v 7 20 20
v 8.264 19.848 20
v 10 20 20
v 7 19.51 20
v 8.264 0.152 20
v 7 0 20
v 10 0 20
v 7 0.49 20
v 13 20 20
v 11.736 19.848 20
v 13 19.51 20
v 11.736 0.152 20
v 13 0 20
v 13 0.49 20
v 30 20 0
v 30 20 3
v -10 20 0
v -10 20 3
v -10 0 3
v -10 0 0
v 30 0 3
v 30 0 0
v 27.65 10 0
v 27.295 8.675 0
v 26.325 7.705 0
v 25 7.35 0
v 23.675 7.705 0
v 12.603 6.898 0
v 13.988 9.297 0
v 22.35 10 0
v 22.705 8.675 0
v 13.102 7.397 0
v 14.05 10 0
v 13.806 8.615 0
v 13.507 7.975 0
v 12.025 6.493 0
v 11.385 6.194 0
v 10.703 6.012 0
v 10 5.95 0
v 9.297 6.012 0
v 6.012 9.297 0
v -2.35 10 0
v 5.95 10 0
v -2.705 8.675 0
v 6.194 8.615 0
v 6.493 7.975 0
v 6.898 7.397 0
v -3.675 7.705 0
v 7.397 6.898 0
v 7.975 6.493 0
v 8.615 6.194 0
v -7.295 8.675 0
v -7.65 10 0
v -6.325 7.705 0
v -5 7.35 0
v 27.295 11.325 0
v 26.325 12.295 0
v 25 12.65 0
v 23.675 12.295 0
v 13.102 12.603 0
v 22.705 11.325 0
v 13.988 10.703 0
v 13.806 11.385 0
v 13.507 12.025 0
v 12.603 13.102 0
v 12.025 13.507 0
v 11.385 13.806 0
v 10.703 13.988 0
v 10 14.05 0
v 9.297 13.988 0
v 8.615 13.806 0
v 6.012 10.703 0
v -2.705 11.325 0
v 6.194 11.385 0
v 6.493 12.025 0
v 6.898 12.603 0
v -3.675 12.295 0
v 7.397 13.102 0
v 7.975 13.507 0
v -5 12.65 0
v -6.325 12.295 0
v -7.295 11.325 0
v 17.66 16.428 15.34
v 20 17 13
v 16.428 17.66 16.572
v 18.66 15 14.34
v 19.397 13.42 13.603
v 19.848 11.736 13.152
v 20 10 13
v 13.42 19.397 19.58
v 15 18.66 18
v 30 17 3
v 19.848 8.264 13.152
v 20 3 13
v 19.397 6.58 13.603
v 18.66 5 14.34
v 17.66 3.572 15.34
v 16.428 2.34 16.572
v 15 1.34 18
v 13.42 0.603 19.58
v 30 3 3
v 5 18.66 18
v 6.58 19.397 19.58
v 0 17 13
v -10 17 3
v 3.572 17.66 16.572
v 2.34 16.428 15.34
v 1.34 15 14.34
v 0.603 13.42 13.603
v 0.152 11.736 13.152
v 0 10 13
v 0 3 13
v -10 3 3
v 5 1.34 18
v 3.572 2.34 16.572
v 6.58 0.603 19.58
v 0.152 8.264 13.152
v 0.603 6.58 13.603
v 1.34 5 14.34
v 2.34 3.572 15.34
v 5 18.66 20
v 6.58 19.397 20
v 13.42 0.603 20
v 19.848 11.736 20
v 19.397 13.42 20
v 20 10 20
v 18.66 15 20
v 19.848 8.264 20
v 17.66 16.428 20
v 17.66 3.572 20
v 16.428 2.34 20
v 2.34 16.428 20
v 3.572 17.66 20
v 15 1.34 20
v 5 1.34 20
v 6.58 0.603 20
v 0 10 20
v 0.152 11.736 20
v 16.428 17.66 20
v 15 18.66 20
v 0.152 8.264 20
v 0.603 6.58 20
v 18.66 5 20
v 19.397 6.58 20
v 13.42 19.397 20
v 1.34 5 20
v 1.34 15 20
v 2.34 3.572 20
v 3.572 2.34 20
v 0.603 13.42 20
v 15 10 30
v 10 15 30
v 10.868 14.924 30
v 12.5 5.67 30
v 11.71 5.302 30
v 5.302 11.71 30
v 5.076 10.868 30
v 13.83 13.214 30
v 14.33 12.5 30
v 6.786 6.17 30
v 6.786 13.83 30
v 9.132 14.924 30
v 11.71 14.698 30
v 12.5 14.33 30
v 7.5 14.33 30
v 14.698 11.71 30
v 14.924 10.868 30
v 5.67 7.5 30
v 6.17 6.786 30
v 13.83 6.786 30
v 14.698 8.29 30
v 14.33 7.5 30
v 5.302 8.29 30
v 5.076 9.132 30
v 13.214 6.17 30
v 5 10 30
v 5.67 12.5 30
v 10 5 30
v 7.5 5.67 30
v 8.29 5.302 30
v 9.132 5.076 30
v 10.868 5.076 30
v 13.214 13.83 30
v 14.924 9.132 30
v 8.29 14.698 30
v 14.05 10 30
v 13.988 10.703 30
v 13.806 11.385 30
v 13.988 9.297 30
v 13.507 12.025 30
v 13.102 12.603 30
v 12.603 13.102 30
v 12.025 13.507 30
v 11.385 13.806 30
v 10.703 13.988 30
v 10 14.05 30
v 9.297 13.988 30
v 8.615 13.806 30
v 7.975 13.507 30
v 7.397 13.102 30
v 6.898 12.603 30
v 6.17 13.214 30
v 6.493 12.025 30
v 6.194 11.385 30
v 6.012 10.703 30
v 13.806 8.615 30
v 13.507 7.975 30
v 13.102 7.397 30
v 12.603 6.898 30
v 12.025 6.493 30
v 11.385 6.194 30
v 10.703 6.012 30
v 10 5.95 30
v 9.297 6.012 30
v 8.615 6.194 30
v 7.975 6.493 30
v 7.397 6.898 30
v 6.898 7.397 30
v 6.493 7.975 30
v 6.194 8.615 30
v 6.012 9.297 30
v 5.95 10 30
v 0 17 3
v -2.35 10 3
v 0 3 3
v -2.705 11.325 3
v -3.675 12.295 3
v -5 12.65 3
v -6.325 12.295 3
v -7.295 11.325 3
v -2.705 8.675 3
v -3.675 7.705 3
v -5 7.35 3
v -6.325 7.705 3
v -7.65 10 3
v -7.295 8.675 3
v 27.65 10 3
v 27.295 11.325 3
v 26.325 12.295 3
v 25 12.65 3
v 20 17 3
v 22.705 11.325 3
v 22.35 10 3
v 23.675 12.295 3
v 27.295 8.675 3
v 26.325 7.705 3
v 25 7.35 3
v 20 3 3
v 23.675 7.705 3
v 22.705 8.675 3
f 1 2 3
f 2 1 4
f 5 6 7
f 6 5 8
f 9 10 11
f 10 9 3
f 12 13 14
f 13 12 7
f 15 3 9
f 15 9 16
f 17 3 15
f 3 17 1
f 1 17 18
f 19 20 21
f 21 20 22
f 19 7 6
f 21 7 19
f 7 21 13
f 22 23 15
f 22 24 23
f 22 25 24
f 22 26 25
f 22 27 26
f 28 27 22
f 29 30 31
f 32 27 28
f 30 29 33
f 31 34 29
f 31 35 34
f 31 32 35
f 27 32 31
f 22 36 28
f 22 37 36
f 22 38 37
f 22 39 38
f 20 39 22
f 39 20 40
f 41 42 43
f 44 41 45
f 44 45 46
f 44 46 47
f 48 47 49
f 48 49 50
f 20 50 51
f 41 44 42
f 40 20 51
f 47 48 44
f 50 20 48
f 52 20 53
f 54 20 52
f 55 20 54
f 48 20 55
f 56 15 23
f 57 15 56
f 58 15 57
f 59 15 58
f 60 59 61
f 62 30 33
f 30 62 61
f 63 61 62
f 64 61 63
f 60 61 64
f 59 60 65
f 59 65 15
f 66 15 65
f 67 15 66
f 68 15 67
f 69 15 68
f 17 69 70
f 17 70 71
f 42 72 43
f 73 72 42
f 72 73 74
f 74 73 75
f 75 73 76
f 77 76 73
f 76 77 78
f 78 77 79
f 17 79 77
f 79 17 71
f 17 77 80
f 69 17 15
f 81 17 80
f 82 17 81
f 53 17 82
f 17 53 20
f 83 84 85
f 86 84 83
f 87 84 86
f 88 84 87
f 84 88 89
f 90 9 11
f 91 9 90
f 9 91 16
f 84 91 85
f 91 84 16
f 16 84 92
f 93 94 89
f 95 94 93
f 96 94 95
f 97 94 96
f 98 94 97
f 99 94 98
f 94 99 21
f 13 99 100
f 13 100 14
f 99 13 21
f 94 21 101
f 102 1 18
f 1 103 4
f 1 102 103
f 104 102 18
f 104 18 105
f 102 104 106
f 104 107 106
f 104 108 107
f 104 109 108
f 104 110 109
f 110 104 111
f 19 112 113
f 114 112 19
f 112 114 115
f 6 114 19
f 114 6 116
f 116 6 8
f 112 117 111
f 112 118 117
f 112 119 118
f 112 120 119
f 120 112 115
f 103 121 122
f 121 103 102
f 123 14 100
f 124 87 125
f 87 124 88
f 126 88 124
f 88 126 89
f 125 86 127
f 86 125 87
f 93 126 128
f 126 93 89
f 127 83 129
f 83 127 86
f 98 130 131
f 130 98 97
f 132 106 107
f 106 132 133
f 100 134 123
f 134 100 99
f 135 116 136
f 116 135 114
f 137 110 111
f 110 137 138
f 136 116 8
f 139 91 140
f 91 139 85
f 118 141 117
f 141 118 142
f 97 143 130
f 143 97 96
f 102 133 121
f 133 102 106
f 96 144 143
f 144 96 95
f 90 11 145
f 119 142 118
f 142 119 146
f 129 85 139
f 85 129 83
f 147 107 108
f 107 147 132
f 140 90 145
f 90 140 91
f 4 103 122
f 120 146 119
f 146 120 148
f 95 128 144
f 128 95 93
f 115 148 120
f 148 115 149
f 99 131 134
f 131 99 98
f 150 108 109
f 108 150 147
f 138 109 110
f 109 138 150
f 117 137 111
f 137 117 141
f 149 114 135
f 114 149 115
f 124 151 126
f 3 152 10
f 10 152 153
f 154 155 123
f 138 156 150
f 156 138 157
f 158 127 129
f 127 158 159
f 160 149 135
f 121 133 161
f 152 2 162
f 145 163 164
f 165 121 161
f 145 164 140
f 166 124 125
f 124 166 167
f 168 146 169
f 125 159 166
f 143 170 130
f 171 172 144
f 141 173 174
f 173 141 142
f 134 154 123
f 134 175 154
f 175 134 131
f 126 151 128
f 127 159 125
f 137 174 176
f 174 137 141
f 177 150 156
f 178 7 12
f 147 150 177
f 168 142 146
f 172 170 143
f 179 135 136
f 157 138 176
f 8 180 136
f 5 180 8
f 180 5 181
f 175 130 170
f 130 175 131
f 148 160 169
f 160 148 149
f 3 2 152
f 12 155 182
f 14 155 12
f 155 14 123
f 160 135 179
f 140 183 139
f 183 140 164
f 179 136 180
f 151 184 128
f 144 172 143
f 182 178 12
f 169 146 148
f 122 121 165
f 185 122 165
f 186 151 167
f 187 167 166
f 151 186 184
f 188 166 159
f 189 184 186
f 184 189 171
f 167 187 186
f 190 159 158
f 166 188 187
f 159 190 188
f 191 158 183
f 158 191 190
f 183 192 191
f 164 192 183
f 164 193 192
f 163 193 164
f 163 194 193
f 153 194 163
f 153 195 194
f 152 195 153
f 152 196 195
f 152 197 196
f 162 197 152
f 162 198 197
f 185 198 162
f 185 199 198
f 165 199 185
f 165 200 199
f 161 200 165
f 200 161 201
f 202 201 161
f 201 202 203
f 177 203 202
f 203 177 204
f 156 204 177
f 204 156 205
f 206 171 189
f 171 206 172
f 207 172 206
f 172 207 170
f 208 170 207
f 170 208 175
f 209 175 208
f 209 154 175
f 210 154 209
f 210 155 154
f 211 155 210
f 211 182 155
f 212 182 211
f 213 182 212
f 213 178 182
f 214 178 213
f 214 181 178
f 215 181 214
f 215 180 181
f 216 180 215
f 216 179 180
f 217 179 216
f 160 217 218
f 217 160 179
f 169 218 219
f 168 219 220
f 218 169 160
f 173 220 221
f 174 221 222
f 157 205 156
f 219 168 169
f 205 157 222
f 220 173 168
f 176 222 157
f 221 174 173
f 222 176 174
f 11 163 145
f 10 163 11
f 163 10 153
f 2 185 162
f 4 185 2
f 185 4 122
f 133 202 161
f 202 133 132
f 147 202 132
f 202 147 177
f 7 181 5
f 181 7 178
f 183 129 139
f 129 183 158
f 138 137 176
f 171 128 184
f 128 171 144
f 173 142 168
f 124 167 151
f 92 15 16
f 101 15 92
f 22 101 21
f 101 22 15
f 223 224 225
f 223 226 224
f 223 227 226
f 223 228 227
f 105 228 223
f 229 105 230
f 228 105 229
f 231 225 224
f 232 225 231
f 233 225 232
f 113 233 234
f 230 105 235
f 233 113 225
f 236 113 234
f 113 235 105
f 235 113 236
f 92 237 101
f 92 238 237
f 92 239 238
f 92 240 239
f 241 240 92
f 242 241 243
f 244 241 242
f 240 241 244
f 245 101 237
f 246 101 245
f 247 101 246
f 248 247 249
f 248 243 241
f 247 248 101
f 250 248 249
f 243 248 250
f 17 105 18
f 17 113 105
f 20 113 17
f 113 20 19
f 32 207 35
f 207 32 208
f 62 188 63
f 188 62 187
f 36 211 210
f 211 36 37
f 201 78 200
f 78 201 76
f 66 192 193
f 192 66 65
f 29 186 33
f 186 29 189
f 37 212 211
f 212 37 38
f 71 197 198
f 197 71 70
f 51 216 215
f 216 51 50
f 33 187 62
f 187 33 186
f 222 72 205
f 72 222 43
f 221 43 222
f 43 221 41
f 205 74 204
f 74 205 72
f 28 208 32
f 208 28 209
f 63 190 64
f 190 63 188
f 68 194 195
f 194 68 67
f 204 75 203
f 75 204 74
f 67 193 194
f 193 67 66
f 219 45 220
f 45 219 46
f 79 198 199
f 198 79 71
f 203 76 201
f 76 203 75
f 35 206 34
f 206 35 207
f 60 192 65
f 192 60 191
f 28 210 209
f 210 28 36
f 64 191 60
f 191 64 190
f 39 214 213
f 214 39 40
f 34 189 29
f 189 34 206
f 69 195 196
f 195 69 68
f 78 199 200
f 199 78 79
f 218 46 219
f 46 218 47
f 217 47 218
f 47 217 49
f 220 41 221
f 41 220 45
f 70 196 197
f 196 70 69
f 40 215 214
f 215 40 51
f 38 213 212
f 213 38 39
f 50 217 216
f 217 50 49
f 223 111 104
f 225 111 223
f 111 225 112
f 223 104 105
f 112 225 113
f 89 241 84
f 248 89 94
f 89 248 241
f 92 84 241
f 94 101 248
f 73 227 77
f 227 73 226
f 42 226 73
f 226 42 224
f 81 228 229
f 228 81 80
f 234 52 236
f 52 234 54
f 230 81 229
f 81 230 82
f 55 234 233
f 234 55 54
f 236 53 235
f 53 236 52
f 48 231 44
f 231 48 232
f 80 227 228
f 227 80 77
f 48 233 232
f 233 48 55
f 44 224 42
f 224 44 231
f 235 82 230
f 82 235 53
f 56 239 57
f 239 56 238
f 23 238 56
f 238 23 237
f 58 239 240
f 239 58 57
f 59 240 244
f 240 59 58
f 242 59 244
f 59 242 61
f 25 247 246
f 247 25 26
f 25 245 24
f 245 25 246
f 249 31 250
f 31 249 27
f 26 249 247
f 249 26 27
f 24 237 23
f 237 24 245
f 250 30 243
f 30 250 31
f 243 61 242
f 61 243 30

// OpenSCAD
difference()
{
    union()
    {
        translate([10,10,0])
            cylinder(d=20,h=20,$fn=36);
        
        translate([10,10,20])
            cylinder(d1=20,d2=10,h=10,$fn=36);
        
        translate([-10,0,0])
            cube([40,20,3]);
        
        difference()
        {
            translate([10,0,3+20])
                rotate([0,45+90,0])
                    cube([20*sqrt(2),20,20*sqrt(2)]);
            union()
            {
                translate([0,0,3+17])
                    cube([20,20,10]);
                translate([-10,0,-30])
                    cube([40,20,30]);
            }
       }
    }
    
    union()
    {
        translate([10,10,0])
            cylinder(d=8.1,h=30,$fn=36);
        
        translate([-10,3,3])
            cube([10,14,20]);
        
        translate([20,3,3])
            cube([10,14,20]);
        
        
        translate([-5,10,0])
            cylinder(d=5.3,h=3,$fn=12);
        translate([25,10,0])
            cylinder(d=5.3,h=3,$fn=12);
    }
}
